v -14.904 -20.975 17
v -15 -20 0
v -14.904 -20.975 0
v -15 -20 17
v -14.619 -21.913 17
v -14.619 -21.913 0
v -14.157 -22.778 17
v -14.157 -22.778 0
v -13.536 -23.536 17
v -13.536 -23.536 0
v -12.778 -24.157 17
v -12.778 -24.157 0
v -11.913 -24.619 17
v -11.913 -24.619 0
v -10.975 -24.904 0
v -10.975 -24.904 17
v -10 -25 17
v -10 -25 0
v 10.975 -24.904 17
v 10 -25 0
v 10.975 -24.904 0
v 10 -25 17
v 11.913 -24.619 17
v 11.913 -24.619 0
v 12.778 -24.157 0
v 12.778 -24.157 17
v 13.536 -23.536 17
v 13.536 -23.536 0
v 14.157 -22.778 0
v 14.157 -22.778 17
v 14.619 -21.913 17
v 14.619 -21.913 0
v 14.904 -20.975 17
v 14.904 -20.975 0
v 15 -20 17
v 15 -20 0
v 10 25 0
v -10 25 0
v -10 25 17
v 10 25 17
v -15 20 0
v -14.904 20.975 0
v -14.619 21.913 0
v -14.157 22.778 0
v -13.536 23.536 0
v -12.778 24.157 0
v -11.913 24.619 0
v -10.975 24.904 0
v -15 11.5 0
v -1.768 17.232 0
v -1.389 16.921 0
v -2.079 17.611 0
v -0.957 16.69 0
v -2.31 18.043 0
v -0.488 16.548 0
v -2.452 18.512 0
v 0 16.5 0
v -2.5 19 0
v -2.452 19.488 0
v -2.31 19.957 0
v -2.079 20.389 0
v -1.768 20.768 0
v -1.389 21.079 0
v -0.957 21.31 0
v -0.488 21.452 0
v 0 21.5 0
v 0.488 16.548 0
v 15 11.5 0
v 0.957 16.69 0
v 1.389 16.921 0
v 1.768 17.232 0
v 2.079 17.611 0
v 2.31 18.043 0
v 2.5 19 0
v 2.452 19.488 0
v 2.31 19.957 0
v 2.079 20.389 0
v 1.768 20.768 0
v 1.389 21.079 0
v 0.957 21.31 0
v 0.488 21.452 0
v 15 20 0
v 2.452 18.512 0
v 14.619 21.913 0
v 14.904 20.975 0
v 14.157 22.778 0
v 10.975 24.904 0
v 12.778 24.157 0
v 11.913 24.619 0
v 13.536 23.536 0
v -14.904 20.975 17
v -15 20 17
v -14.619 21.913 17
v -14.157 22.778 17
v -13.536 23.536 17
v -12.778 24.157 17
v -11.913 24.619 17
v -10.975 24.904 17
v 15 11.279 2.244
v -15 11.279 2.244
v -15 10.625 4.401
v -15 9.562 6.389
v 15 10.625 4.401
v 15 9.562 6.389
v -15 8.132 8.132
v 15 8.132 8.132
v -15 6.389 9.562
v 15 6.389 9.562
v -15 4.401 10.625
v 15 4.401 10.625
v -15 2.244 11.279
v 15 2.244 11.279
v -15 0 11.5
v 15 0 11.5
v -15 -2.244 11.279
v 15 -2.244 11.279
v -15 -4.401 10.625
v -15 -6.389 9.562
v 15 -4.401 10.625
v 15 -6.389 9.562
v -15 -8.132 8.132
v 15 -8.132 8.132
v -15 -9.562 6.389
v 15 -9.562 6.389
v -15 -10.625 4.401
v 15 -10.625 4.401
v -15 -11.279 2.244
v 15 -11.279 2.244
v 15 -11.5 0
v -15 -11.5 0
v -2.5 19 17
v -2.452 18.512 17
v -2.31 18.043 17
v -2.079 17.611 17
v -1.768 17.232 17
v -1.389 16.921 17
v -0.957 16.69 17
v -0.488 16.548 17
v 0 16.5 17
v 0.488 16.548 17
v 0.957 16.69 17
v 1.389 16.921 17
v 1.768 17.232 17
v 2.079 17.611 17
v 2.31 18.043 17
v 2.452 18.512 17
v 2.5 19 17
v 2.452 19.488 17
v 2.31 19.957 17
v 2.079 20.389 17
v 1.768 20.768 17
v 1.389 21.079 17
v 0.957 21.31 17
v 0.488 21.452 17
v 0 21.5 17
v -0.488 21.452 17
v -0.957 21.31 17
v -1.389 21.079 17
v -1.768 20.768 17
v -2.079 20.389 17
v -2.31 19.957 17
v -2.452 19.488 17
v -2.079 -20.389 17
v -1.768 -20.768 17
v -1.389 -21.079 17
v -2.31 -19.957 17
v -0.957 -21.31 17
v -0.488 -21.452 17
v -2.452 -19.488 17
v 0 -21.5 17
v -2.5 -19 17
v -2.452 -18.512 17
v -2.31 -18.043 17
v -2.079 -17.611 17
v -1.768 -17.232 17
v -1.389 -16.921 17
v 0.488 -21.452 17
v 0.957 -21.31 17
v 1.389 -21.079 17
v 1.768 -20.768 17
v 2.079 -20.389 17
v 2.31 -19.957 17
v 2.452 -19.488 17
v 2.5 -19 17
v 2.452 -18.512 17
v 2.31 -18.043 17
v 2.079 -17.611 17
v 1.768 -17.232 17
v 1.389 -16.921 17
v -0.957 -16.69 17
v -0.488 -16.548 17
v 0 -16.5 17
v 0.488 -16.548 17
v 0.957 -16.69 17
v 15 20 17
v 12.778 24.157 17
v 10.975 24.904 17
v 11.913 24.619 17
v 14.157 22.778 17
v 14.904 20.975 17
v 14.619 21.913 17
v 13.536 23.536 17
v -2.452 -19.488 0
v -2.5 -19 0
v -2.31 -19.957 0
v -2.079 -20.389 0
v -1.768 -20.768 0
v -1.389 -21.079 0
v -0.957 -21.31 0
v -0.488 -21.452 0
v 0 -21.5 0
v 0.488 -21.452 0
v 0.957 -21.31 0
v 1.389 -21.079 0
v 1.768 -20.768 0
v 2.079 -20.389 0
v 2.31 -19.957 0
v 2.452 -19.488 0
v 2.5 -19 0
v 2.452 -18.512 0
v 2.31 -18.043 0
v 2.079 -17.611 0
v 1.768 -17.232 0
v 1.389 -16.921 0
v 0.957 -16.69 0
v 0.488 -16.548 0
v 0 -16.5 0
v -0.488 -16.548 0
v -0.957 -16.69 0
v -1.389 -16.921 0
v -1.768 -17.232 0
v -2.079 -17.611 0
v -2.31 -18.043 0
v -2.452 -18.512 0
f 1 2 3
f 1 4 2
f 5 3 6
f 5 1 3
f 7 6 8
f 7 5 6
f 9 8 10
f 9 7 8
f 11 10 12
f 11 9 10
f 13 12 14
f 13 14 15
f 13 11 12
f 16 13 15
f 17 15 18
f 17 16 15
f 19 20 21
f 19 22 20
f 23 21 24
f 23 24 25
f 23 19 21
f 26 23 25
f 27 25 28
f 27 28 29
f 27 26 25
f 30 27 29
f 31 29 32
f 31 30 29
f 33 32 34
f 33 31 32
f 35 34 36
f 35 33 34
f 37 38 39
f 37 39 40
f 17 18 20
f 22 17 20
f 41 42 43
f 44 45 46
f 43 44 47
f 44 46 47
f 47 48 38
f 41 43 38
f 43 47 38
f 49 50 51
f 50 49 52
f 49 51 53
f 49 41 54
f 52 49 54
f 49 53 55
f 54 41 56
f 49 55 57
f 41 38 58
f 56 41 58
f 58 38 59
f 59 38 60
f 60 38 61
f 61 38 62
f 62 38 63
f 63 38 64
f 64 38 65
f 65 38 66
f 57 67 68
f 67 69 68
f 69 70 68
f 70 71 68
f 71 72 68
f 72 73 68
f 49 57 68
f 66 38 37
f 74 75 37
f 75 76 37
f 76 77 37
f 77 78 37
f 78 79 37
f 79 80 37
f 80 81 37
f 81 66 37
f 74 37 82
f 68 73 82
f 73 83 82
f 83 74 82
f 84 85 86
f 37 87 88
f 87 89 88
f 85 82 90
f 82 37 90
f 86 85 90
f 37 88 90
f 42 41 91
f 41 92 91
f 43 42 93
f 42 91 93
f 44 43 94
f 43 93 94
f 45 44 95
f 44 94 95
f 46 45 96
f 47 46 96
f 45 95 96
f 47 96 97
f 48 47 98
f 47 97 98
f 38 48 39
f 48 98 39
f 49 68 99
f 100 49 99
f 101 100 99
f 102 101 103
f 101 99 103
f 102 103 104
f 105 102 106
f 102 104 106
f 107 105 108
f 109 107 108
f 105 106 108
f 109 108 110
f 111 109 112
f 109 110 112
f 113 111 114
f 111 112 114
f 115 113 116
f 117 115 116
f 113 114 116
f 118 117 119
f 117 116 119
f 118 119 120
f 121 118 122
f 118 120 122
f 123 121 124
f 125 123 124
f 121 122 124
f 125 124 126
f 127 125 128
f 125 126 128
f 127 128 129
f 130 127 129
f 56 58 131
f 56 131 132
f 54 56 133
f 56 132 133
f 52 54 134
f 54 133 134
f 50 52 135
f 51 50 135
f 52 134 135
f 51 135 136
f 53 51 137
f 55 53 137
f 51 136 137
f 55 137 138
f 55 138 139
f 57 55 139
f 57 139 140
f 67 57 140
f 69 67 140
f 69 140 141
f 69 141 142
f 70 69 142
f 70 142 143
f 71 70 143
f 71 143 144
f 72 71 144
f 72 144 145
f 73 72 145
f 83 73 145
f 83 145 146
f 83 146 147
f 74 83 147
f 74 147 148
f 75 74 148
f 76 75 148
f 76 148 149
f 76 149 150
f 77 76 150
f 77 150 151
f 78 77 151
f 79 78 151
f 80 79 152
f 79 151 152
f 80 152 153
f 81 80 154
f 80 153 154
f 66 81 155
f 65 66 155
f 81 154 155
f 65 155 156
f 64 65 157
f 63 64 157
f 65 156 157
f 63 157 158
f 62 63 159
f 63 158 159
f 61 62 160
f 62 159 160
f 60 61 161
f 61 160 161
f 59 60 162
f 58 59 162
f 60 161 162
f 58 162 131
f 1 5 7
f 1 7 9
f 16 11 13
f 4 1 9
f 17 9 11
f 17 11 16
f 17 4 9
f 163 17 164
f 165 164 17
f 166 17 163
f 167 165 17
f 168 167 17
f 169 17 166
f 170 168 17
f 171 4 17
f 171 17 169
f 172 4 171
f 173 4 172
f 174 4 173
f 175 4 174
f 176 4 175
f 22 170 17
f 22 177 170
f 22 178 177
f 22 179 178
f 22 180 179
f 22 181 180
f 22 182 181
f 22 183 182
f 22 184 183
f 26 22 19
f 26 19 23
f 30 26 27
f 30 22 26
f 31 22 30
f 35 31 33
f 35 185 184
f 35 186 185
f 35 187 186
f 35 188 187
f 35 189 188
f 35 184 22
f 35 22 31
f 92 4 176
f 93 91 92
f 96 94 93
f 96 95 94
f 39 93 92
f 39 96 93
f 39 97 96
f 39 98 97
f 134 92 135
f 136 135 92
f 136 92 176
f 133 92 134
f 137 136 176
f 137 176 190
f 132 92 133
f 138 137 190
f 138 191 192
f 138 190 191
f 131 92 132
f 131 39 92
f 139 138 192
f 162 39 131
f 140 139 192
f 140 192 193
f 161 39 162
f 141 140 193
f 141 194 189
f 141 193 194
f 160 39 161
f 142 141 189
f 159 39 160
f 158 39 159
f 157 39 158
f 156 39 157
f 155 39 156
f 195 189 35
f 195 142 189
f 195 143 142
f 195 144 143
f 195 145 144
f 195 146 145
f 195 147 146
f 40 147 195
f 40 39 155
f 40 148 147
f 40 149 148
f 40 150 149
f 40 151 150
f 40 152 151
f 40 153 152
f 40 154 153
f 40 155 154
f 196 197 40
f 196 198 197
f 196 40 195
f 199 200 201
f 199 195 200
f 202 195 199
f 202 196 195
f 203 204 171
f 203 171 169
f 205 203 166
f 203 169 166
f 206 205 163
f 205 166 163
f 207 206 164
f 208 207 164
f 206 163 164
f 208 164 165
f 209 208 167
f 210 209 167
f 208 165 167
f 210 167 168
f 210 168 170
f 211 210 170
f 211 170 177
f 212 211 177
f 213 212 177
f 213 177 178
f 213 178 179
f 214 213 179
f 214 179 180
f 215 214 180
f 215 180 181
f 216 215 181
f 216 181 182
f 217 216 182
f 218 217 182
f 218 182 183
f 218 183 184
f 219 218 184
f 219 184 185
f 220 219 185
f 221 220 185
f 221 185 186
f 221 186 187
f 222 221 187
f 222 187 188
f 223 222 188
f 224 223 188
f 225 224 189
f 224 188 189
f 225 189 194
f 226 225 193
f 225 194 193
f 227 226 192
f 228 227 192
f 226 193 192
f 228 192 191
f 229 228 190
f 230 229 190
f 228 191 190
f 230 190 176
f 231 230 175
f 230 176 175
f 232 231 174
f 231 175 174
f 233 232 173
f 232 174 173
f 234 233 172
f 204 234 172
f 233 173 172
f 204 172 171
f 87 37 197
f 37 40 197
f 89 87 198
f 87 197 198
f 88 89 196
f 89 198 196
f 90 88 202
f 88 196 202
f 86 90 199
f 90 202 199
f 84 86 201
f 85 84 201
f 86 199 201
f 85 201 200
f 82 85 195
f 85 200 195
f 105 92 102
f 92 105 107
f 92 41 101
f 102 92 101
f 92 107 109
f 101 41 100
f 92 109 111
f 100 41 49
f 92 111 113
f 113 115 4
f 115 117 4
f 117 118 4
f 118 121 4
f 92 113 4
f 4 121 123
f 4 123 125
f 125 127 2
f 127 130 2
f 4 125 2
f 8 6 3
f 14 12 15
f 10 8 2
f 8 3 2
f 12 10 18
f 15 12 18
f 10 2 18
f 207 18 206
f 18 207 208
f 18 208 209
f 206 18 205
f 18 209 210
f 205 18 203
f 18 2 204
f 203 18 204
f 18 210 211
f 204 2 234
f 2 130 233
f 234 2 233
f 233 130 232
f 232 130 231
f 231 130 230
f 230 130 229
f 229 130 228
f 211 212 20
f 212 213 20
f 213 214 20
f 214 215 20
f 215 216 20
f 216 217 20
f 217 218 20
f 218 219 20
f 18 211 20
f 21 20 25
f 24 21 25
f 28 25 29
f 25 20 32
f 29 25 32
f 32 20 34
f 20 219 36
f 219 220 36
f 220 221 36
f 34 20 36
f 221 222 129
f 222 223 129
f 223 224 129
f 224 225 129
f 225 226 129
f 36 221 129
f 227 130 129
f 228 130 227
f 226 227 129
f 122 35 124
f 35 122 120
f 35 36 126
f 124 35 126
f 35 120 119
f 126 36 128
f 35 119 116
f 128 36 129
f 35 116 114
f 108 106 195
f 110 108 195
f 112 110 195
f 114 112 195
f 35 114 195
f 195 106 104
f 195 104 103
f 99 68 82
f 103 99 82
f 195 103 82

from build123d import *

# Parameters (mm, degrees)
F0_W     = 30
F0_H     = 25
F1_DEPTH = 17
F2_D     = 5
F4_DEPTH = 50
F5_R     = 5


with BuildPart() as f1:
    # F0 (on Top) → F1 (new body)
    with BuildSketch(Plane.XY):
        with Locations((0, 12.5)):
            Rectangle(F0_W, F0_H)
        with Locations((0, -12.5)):
            Rectangle(F0_W, F0_H)
    extrude(amount=F1_DEPTH)

    # F2 (through all)
    with Locations(Plane(origin=(0, 0, 0), x_dir=(1, 0, 0), z_dir=(0, 0, -1))):
        with Locations((0, 19), (0, -19)):
            Hole(F2_D / 2)

    # F3 (on face) → F4 (cut)
    with BuildSketch(Plane.YZ.offset(15)):
        with BuildLine():
            ThreePointArc((-11.5, 0), (0, -11.5), (11.5, 0))
            Line((11.5, 0), (-11.5, 0))
        make_face()
        with BuildLine():
            Line((-11.5, 0), (11.5, 0))
            ThreePointArc((11.5, 0), (0, 11.5), (-11.5, 0))
        make_face()
    extrude(amount=-F4_DEPTH, mode=Mode.SUBTRACT)

    # F5
    f5_edges = [f1.edges().sort_by_distance(p)[0] for p in [
        (15, -25, 8.5),
        (-15, -25, 8.5),
        (15, 25, 8.5),
        (-15, 25, 8.5),
    ]]
    fillet(f5_edges, radius=F5_R)


solid = f1.part
